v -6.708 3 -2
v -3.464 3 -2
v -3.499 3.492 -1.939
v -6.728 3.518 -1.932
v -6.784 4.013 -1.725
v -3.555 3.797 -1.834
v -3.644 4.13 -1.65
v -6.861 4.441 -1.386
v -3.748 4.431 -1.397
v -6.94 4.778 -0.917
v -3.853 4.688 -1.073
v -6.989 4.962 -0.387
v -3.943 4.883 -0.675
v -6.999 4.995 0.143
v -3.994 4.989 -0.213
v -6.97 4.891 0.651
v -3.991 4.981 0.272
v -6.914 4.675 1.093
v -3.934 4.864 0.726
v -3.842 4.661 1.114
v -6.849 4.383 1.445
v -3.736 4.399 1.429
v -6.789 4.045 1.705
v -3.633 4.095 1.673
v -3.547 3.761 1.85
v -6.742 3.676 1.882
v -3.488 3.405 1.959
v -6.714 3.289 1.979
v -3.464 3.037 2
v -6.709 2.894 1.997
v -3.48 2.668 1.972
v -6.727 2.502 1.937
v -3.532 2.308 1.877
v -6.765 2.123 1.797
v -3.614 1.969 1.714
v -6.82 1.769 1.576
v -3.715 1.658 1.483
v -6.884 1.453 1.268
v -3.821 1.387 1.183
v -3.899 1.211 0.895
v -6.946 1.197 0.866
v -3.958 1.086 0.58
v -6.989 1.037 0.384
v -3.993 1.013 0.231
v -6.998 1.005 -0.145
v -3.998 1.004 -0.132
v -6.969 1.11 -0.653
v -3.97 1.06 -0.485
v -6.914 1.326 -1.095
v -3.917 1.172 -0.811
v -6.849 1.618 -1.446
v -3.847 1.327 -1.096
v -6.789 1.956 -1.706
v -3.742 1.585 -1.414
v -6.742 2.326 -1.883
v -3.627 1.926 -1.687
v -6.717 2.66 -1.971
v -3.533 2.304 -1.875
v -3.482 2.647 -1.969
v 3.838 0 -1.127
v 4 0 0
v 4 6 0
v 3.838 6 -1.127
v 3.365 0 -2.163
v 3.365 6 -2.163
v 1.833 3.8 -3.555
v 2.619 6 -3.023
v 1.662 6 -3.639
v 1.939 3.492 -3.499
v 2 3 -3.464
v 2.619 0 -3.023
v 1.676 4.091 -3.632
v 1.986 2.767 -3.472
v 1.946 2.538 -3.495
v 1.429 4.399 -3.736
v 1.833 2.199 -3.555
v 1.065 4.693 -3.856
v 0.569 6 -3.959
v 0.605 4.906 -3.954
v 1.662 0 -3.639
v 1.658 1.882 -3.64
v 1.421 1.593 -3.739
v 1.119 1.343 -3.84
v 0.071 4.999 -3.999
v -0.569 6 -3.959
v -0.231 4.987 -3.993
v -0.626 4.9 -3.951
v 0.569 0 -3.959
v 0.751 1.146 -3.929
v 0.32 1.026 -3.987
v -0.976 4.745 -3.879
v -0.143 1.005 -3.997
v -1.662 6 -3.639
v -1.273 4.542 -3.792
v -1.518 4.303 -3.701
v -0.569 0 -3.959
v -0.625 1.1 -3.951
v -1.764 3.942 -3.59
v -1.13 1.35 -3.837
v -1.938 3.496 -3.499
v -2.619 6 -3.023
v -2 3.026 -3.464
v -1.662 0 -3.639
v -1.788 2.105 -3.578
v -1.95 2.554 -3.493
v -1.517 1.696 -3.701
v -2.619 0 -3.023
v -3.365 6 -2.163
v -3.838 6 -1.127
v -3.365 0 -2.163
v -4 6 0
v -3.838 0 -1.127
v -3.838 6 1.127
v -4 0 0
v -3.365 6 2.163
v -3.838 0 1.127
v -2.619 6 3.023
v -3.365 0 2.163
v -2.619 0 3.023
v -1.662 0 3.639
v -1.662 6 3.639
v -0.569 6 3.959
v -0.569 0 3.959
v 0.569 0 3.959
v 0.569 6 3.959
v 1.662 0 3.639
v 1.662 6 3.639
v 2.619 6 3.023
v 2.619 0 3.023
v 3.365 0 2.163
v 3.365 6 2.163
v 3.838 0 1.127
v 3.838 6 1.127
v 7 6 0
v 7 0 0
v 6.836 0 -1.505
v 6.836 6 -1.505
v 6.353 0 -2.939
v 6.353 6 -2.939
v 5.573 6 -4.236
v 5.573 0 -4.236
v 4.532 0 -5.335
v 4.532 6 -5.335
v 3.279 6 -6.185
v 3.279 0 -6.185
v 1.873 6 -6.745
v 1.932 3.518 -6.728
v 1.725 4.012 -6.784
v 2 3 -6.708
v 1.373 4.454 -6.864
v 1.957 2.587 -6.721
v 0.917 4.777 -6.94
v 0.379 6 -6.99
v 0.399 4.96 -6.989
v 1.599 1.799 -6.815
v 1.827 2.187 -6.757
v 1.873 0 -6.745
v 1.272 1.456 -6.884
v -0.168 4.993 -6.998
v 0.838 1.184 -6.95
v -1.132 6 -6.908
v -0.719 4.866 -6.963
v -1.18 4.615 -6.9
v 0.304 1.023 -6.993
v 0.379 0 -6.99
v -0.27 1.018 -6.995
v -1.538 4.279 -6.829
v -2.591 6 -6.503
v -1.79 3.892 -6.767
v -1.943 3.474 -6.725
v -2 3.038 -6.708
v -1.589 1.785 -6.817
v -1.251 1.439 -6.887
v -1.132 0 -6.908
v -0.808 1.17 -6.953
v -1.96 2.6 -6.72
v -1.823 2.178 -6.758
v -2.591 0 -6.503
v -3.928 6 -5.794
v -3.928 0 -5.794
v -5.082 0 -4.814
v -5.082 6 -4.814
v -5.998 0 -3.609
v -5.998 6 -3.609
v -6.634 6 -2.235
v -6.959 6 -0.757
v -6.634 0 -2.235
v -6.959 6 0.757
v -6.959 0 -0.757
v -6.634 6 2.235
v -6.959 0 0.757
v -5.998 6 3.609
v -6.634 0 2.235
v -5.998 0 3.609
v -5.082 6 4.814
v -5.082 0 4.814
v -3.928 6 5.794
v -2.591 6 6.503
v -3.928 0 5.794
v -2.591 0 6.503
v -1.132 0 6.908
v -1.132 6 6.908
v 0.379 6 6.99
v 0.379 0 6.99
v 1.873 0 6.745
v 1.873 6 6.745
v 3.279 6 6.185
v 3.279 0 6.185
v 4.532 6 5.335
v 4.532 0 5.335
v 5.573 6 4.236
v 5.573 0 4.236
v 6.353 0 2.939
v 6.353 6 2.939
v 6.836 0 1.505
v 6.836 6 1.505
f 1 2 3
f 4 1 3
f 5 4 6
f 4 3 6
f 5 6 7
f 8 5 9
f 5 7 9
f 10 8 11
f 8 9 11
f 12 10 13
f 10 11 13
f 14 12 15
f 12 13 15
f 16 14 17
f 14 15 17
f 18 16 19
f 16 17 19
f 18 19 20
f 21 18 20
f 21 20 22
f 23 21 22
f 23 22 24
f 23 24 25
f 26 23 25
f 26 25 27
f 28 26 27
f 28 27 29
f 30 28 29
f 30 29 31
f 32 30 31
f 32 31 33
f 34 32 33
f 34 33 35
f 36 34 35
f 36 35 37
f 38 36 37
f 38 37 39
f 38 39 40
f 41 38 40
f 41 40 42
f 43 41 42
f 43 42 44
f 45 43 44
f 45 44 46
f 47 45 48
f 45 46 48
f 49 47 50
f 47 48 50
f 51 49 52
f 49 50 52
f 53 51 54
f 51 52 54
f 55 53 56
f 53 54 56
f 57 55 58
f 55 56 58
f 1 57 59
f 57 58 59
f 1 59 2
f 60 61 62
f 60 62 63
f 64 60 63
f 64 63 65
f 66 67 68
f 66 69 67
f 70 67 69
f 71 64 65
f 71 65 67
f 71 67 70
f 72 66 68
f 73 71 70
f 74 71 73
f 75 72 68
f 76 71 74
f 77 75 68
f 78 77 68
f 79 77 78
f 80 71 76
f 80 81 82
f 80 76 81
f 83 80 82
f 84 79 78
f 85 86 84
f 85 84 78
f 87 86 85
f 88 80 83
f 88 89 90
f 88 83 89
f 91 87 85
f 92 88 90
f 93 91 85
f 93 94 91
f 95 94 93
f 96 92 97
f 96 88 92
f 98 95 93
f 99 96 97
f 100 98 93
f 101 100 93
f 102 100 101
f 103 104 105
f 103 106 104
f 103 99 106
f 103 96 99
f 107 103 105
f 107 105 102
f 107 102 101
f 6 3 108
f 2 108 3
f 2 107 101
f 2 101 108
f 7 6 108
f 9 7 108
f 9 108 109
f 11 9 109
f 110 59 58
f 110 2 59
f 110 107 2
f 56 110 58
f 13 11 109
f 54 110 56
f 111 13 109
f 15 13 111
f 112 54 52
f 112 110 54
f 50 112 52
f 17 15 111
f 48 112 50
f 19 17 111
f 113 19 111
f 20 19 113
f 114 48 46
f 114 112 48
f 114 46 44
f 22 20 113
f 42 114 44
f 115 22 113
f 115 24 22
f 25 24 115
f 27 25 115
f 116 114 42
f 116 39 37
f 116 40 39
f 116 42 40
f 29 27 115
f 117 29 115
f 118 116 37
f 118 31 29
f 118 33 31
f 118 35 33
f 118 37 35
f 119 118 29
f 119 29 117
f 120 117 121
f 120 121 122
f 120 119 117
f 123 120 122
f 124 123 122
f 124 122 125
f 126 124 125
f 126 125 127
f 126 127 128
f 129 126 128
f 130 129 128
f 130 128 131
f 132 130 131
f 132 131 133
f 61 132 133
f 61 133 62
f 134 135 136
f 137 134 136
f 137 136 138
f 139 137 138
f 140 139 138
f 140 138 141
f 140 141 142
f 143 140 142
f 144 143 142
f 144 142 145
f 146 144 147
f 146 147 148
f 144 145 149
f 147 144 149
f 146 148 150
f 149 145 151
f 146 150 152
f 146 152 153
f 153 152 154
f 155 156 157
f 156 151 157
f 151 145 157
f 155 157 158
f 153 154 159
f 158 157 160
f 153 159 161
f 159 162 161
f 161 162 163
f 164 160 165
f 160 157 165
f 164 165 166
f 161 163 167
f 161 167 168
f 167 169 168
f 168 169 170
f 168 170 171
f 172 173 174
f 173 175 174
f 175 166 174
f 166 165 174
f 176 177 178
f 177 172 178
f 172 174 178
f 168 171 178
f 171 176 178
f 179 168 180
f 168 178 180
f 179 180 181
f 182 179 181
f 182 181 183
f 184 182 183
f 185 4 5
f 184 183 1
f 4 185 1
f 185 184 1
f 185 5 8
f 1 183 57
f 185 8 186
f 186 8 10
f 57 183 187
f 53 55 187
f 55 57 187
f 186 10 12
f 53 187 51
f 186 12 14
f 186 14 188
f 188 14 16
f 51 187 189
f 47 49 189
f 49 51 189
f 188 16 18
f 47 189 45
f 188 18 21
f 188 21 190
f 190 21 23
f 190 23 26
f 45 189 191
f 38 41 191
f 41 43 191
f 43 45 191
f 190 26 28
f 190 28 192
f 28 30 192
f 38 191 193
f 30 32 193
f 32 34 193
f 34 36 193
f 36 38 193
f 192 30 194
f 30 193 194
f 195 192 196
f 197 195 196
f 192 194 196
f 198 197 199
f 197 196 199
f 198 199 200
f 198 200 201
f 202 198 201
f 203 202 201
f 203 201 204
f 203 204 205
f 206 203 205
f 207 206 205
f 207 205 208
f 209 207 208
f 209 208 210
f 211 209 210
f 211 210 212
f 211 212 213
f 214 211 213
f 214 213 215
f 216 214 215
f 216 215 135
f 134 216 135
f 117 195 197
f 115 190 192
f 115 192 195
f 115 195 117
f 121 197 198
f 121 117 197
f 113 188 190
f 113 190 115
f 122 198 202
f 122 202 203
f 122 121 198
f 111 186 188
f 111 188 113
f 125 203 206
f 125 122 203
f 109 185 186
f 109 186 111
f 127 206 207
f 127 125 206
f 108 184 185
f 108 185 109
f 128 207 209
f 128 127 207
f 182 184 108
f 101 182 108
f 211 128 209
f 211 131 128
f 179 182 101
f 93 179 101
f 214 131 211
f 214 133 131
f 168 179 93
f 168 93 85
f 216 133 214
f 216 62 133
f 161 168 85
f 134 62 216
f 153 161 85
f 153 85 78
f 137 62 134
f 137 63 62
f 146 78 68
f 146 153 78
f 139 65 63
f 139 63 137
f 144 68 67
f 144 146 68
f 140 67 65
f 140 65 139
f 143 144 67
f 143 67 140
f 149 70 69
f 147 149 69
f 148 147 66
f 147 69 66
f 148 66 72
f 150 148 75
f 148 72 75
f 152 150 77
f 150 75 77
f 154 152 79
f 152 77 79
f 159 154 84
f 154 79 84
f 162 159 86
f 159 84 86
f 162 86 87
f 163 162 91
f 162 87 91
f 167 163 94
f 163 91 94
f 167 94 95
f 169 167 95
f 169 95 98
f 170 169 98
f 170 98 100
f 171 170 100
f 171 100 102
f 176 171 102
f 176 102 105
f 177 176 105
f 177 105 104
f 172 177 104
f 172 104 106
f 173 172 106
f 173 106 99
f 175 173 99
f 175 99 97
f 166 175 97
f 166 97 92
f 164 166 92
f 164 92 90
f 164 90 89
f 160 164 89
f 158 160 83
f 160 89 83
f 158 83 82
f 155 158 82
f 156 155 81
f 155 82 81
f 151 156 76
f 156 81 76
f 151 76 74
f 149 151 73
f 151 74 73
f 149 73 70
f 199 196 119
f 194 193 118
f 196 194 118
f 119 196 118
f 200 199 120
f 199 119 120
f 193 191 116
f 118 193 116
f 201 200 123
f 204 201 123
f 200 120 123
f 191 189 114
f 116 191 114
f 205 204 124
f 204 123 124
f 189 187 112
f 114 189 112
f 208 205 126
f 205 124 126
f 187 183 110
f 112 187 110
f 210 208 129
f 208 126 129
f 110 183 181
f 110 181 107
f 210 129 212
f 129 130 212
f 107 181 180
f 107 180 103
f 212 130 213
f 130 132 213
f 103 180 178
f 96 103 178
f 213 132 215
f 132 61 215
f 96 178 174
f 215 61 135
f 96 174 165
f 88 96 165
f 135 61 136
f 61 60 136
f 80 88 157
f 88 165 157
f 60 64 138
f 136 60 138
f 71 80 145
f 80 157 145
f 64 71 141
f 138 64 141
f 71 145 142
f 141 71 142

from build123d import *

# Parameters (mm, degrees)
SKETCH_1_R          = 7
SKETCH_1_R_2        = 4
EXTRUDE_1_DEPTH     = 6
SKETCH_2_R          = 2
CUT_EXTRUDE_1_DEPTH = 10
SKETCH_3_R          = 2
CUT_EXTRUDE_2_DEPTH = 10


with BuildPart() as part:
    # 草图1 → 凸台-拉伸1 (new body)
    with BuildSketch(Plane(origin=(0, 0, 0), x_dir=(1, 0, 0), z_dir=(0, 1, 0))):
        Circle(SKETCH_1_R)
        Circle(SKETCH_1_R_2, mode=Mode.SUBTRACT)
    extrude(amount=EXTRUDE_1_DEPTH)

    # 草图2 → 切除-拉伸1 (cut)
    with BuildSketch(Plane(origin=(0, 0, 0), x_dir=(0, 0, -1), z_dir=(1, 0, 0))):
        with Locations((0, 3)):
            Circle(SKETCH_2_R)
    extrude(amount=-CUT_EXTRUDE_1_DEPTH, mode=Mode.SUBTRACT)

    # 草图3 → 切除-拉伸2 (cut)
    with BuildSketch(Plane.XY):
        with Locations((0, 3)):
            Circle(SKETCH_3_R)
    extrude(amount=-CUT_EXTRUDE_2_DEPTH, mode=Mode.SUBTRACT)


solid = part.part
